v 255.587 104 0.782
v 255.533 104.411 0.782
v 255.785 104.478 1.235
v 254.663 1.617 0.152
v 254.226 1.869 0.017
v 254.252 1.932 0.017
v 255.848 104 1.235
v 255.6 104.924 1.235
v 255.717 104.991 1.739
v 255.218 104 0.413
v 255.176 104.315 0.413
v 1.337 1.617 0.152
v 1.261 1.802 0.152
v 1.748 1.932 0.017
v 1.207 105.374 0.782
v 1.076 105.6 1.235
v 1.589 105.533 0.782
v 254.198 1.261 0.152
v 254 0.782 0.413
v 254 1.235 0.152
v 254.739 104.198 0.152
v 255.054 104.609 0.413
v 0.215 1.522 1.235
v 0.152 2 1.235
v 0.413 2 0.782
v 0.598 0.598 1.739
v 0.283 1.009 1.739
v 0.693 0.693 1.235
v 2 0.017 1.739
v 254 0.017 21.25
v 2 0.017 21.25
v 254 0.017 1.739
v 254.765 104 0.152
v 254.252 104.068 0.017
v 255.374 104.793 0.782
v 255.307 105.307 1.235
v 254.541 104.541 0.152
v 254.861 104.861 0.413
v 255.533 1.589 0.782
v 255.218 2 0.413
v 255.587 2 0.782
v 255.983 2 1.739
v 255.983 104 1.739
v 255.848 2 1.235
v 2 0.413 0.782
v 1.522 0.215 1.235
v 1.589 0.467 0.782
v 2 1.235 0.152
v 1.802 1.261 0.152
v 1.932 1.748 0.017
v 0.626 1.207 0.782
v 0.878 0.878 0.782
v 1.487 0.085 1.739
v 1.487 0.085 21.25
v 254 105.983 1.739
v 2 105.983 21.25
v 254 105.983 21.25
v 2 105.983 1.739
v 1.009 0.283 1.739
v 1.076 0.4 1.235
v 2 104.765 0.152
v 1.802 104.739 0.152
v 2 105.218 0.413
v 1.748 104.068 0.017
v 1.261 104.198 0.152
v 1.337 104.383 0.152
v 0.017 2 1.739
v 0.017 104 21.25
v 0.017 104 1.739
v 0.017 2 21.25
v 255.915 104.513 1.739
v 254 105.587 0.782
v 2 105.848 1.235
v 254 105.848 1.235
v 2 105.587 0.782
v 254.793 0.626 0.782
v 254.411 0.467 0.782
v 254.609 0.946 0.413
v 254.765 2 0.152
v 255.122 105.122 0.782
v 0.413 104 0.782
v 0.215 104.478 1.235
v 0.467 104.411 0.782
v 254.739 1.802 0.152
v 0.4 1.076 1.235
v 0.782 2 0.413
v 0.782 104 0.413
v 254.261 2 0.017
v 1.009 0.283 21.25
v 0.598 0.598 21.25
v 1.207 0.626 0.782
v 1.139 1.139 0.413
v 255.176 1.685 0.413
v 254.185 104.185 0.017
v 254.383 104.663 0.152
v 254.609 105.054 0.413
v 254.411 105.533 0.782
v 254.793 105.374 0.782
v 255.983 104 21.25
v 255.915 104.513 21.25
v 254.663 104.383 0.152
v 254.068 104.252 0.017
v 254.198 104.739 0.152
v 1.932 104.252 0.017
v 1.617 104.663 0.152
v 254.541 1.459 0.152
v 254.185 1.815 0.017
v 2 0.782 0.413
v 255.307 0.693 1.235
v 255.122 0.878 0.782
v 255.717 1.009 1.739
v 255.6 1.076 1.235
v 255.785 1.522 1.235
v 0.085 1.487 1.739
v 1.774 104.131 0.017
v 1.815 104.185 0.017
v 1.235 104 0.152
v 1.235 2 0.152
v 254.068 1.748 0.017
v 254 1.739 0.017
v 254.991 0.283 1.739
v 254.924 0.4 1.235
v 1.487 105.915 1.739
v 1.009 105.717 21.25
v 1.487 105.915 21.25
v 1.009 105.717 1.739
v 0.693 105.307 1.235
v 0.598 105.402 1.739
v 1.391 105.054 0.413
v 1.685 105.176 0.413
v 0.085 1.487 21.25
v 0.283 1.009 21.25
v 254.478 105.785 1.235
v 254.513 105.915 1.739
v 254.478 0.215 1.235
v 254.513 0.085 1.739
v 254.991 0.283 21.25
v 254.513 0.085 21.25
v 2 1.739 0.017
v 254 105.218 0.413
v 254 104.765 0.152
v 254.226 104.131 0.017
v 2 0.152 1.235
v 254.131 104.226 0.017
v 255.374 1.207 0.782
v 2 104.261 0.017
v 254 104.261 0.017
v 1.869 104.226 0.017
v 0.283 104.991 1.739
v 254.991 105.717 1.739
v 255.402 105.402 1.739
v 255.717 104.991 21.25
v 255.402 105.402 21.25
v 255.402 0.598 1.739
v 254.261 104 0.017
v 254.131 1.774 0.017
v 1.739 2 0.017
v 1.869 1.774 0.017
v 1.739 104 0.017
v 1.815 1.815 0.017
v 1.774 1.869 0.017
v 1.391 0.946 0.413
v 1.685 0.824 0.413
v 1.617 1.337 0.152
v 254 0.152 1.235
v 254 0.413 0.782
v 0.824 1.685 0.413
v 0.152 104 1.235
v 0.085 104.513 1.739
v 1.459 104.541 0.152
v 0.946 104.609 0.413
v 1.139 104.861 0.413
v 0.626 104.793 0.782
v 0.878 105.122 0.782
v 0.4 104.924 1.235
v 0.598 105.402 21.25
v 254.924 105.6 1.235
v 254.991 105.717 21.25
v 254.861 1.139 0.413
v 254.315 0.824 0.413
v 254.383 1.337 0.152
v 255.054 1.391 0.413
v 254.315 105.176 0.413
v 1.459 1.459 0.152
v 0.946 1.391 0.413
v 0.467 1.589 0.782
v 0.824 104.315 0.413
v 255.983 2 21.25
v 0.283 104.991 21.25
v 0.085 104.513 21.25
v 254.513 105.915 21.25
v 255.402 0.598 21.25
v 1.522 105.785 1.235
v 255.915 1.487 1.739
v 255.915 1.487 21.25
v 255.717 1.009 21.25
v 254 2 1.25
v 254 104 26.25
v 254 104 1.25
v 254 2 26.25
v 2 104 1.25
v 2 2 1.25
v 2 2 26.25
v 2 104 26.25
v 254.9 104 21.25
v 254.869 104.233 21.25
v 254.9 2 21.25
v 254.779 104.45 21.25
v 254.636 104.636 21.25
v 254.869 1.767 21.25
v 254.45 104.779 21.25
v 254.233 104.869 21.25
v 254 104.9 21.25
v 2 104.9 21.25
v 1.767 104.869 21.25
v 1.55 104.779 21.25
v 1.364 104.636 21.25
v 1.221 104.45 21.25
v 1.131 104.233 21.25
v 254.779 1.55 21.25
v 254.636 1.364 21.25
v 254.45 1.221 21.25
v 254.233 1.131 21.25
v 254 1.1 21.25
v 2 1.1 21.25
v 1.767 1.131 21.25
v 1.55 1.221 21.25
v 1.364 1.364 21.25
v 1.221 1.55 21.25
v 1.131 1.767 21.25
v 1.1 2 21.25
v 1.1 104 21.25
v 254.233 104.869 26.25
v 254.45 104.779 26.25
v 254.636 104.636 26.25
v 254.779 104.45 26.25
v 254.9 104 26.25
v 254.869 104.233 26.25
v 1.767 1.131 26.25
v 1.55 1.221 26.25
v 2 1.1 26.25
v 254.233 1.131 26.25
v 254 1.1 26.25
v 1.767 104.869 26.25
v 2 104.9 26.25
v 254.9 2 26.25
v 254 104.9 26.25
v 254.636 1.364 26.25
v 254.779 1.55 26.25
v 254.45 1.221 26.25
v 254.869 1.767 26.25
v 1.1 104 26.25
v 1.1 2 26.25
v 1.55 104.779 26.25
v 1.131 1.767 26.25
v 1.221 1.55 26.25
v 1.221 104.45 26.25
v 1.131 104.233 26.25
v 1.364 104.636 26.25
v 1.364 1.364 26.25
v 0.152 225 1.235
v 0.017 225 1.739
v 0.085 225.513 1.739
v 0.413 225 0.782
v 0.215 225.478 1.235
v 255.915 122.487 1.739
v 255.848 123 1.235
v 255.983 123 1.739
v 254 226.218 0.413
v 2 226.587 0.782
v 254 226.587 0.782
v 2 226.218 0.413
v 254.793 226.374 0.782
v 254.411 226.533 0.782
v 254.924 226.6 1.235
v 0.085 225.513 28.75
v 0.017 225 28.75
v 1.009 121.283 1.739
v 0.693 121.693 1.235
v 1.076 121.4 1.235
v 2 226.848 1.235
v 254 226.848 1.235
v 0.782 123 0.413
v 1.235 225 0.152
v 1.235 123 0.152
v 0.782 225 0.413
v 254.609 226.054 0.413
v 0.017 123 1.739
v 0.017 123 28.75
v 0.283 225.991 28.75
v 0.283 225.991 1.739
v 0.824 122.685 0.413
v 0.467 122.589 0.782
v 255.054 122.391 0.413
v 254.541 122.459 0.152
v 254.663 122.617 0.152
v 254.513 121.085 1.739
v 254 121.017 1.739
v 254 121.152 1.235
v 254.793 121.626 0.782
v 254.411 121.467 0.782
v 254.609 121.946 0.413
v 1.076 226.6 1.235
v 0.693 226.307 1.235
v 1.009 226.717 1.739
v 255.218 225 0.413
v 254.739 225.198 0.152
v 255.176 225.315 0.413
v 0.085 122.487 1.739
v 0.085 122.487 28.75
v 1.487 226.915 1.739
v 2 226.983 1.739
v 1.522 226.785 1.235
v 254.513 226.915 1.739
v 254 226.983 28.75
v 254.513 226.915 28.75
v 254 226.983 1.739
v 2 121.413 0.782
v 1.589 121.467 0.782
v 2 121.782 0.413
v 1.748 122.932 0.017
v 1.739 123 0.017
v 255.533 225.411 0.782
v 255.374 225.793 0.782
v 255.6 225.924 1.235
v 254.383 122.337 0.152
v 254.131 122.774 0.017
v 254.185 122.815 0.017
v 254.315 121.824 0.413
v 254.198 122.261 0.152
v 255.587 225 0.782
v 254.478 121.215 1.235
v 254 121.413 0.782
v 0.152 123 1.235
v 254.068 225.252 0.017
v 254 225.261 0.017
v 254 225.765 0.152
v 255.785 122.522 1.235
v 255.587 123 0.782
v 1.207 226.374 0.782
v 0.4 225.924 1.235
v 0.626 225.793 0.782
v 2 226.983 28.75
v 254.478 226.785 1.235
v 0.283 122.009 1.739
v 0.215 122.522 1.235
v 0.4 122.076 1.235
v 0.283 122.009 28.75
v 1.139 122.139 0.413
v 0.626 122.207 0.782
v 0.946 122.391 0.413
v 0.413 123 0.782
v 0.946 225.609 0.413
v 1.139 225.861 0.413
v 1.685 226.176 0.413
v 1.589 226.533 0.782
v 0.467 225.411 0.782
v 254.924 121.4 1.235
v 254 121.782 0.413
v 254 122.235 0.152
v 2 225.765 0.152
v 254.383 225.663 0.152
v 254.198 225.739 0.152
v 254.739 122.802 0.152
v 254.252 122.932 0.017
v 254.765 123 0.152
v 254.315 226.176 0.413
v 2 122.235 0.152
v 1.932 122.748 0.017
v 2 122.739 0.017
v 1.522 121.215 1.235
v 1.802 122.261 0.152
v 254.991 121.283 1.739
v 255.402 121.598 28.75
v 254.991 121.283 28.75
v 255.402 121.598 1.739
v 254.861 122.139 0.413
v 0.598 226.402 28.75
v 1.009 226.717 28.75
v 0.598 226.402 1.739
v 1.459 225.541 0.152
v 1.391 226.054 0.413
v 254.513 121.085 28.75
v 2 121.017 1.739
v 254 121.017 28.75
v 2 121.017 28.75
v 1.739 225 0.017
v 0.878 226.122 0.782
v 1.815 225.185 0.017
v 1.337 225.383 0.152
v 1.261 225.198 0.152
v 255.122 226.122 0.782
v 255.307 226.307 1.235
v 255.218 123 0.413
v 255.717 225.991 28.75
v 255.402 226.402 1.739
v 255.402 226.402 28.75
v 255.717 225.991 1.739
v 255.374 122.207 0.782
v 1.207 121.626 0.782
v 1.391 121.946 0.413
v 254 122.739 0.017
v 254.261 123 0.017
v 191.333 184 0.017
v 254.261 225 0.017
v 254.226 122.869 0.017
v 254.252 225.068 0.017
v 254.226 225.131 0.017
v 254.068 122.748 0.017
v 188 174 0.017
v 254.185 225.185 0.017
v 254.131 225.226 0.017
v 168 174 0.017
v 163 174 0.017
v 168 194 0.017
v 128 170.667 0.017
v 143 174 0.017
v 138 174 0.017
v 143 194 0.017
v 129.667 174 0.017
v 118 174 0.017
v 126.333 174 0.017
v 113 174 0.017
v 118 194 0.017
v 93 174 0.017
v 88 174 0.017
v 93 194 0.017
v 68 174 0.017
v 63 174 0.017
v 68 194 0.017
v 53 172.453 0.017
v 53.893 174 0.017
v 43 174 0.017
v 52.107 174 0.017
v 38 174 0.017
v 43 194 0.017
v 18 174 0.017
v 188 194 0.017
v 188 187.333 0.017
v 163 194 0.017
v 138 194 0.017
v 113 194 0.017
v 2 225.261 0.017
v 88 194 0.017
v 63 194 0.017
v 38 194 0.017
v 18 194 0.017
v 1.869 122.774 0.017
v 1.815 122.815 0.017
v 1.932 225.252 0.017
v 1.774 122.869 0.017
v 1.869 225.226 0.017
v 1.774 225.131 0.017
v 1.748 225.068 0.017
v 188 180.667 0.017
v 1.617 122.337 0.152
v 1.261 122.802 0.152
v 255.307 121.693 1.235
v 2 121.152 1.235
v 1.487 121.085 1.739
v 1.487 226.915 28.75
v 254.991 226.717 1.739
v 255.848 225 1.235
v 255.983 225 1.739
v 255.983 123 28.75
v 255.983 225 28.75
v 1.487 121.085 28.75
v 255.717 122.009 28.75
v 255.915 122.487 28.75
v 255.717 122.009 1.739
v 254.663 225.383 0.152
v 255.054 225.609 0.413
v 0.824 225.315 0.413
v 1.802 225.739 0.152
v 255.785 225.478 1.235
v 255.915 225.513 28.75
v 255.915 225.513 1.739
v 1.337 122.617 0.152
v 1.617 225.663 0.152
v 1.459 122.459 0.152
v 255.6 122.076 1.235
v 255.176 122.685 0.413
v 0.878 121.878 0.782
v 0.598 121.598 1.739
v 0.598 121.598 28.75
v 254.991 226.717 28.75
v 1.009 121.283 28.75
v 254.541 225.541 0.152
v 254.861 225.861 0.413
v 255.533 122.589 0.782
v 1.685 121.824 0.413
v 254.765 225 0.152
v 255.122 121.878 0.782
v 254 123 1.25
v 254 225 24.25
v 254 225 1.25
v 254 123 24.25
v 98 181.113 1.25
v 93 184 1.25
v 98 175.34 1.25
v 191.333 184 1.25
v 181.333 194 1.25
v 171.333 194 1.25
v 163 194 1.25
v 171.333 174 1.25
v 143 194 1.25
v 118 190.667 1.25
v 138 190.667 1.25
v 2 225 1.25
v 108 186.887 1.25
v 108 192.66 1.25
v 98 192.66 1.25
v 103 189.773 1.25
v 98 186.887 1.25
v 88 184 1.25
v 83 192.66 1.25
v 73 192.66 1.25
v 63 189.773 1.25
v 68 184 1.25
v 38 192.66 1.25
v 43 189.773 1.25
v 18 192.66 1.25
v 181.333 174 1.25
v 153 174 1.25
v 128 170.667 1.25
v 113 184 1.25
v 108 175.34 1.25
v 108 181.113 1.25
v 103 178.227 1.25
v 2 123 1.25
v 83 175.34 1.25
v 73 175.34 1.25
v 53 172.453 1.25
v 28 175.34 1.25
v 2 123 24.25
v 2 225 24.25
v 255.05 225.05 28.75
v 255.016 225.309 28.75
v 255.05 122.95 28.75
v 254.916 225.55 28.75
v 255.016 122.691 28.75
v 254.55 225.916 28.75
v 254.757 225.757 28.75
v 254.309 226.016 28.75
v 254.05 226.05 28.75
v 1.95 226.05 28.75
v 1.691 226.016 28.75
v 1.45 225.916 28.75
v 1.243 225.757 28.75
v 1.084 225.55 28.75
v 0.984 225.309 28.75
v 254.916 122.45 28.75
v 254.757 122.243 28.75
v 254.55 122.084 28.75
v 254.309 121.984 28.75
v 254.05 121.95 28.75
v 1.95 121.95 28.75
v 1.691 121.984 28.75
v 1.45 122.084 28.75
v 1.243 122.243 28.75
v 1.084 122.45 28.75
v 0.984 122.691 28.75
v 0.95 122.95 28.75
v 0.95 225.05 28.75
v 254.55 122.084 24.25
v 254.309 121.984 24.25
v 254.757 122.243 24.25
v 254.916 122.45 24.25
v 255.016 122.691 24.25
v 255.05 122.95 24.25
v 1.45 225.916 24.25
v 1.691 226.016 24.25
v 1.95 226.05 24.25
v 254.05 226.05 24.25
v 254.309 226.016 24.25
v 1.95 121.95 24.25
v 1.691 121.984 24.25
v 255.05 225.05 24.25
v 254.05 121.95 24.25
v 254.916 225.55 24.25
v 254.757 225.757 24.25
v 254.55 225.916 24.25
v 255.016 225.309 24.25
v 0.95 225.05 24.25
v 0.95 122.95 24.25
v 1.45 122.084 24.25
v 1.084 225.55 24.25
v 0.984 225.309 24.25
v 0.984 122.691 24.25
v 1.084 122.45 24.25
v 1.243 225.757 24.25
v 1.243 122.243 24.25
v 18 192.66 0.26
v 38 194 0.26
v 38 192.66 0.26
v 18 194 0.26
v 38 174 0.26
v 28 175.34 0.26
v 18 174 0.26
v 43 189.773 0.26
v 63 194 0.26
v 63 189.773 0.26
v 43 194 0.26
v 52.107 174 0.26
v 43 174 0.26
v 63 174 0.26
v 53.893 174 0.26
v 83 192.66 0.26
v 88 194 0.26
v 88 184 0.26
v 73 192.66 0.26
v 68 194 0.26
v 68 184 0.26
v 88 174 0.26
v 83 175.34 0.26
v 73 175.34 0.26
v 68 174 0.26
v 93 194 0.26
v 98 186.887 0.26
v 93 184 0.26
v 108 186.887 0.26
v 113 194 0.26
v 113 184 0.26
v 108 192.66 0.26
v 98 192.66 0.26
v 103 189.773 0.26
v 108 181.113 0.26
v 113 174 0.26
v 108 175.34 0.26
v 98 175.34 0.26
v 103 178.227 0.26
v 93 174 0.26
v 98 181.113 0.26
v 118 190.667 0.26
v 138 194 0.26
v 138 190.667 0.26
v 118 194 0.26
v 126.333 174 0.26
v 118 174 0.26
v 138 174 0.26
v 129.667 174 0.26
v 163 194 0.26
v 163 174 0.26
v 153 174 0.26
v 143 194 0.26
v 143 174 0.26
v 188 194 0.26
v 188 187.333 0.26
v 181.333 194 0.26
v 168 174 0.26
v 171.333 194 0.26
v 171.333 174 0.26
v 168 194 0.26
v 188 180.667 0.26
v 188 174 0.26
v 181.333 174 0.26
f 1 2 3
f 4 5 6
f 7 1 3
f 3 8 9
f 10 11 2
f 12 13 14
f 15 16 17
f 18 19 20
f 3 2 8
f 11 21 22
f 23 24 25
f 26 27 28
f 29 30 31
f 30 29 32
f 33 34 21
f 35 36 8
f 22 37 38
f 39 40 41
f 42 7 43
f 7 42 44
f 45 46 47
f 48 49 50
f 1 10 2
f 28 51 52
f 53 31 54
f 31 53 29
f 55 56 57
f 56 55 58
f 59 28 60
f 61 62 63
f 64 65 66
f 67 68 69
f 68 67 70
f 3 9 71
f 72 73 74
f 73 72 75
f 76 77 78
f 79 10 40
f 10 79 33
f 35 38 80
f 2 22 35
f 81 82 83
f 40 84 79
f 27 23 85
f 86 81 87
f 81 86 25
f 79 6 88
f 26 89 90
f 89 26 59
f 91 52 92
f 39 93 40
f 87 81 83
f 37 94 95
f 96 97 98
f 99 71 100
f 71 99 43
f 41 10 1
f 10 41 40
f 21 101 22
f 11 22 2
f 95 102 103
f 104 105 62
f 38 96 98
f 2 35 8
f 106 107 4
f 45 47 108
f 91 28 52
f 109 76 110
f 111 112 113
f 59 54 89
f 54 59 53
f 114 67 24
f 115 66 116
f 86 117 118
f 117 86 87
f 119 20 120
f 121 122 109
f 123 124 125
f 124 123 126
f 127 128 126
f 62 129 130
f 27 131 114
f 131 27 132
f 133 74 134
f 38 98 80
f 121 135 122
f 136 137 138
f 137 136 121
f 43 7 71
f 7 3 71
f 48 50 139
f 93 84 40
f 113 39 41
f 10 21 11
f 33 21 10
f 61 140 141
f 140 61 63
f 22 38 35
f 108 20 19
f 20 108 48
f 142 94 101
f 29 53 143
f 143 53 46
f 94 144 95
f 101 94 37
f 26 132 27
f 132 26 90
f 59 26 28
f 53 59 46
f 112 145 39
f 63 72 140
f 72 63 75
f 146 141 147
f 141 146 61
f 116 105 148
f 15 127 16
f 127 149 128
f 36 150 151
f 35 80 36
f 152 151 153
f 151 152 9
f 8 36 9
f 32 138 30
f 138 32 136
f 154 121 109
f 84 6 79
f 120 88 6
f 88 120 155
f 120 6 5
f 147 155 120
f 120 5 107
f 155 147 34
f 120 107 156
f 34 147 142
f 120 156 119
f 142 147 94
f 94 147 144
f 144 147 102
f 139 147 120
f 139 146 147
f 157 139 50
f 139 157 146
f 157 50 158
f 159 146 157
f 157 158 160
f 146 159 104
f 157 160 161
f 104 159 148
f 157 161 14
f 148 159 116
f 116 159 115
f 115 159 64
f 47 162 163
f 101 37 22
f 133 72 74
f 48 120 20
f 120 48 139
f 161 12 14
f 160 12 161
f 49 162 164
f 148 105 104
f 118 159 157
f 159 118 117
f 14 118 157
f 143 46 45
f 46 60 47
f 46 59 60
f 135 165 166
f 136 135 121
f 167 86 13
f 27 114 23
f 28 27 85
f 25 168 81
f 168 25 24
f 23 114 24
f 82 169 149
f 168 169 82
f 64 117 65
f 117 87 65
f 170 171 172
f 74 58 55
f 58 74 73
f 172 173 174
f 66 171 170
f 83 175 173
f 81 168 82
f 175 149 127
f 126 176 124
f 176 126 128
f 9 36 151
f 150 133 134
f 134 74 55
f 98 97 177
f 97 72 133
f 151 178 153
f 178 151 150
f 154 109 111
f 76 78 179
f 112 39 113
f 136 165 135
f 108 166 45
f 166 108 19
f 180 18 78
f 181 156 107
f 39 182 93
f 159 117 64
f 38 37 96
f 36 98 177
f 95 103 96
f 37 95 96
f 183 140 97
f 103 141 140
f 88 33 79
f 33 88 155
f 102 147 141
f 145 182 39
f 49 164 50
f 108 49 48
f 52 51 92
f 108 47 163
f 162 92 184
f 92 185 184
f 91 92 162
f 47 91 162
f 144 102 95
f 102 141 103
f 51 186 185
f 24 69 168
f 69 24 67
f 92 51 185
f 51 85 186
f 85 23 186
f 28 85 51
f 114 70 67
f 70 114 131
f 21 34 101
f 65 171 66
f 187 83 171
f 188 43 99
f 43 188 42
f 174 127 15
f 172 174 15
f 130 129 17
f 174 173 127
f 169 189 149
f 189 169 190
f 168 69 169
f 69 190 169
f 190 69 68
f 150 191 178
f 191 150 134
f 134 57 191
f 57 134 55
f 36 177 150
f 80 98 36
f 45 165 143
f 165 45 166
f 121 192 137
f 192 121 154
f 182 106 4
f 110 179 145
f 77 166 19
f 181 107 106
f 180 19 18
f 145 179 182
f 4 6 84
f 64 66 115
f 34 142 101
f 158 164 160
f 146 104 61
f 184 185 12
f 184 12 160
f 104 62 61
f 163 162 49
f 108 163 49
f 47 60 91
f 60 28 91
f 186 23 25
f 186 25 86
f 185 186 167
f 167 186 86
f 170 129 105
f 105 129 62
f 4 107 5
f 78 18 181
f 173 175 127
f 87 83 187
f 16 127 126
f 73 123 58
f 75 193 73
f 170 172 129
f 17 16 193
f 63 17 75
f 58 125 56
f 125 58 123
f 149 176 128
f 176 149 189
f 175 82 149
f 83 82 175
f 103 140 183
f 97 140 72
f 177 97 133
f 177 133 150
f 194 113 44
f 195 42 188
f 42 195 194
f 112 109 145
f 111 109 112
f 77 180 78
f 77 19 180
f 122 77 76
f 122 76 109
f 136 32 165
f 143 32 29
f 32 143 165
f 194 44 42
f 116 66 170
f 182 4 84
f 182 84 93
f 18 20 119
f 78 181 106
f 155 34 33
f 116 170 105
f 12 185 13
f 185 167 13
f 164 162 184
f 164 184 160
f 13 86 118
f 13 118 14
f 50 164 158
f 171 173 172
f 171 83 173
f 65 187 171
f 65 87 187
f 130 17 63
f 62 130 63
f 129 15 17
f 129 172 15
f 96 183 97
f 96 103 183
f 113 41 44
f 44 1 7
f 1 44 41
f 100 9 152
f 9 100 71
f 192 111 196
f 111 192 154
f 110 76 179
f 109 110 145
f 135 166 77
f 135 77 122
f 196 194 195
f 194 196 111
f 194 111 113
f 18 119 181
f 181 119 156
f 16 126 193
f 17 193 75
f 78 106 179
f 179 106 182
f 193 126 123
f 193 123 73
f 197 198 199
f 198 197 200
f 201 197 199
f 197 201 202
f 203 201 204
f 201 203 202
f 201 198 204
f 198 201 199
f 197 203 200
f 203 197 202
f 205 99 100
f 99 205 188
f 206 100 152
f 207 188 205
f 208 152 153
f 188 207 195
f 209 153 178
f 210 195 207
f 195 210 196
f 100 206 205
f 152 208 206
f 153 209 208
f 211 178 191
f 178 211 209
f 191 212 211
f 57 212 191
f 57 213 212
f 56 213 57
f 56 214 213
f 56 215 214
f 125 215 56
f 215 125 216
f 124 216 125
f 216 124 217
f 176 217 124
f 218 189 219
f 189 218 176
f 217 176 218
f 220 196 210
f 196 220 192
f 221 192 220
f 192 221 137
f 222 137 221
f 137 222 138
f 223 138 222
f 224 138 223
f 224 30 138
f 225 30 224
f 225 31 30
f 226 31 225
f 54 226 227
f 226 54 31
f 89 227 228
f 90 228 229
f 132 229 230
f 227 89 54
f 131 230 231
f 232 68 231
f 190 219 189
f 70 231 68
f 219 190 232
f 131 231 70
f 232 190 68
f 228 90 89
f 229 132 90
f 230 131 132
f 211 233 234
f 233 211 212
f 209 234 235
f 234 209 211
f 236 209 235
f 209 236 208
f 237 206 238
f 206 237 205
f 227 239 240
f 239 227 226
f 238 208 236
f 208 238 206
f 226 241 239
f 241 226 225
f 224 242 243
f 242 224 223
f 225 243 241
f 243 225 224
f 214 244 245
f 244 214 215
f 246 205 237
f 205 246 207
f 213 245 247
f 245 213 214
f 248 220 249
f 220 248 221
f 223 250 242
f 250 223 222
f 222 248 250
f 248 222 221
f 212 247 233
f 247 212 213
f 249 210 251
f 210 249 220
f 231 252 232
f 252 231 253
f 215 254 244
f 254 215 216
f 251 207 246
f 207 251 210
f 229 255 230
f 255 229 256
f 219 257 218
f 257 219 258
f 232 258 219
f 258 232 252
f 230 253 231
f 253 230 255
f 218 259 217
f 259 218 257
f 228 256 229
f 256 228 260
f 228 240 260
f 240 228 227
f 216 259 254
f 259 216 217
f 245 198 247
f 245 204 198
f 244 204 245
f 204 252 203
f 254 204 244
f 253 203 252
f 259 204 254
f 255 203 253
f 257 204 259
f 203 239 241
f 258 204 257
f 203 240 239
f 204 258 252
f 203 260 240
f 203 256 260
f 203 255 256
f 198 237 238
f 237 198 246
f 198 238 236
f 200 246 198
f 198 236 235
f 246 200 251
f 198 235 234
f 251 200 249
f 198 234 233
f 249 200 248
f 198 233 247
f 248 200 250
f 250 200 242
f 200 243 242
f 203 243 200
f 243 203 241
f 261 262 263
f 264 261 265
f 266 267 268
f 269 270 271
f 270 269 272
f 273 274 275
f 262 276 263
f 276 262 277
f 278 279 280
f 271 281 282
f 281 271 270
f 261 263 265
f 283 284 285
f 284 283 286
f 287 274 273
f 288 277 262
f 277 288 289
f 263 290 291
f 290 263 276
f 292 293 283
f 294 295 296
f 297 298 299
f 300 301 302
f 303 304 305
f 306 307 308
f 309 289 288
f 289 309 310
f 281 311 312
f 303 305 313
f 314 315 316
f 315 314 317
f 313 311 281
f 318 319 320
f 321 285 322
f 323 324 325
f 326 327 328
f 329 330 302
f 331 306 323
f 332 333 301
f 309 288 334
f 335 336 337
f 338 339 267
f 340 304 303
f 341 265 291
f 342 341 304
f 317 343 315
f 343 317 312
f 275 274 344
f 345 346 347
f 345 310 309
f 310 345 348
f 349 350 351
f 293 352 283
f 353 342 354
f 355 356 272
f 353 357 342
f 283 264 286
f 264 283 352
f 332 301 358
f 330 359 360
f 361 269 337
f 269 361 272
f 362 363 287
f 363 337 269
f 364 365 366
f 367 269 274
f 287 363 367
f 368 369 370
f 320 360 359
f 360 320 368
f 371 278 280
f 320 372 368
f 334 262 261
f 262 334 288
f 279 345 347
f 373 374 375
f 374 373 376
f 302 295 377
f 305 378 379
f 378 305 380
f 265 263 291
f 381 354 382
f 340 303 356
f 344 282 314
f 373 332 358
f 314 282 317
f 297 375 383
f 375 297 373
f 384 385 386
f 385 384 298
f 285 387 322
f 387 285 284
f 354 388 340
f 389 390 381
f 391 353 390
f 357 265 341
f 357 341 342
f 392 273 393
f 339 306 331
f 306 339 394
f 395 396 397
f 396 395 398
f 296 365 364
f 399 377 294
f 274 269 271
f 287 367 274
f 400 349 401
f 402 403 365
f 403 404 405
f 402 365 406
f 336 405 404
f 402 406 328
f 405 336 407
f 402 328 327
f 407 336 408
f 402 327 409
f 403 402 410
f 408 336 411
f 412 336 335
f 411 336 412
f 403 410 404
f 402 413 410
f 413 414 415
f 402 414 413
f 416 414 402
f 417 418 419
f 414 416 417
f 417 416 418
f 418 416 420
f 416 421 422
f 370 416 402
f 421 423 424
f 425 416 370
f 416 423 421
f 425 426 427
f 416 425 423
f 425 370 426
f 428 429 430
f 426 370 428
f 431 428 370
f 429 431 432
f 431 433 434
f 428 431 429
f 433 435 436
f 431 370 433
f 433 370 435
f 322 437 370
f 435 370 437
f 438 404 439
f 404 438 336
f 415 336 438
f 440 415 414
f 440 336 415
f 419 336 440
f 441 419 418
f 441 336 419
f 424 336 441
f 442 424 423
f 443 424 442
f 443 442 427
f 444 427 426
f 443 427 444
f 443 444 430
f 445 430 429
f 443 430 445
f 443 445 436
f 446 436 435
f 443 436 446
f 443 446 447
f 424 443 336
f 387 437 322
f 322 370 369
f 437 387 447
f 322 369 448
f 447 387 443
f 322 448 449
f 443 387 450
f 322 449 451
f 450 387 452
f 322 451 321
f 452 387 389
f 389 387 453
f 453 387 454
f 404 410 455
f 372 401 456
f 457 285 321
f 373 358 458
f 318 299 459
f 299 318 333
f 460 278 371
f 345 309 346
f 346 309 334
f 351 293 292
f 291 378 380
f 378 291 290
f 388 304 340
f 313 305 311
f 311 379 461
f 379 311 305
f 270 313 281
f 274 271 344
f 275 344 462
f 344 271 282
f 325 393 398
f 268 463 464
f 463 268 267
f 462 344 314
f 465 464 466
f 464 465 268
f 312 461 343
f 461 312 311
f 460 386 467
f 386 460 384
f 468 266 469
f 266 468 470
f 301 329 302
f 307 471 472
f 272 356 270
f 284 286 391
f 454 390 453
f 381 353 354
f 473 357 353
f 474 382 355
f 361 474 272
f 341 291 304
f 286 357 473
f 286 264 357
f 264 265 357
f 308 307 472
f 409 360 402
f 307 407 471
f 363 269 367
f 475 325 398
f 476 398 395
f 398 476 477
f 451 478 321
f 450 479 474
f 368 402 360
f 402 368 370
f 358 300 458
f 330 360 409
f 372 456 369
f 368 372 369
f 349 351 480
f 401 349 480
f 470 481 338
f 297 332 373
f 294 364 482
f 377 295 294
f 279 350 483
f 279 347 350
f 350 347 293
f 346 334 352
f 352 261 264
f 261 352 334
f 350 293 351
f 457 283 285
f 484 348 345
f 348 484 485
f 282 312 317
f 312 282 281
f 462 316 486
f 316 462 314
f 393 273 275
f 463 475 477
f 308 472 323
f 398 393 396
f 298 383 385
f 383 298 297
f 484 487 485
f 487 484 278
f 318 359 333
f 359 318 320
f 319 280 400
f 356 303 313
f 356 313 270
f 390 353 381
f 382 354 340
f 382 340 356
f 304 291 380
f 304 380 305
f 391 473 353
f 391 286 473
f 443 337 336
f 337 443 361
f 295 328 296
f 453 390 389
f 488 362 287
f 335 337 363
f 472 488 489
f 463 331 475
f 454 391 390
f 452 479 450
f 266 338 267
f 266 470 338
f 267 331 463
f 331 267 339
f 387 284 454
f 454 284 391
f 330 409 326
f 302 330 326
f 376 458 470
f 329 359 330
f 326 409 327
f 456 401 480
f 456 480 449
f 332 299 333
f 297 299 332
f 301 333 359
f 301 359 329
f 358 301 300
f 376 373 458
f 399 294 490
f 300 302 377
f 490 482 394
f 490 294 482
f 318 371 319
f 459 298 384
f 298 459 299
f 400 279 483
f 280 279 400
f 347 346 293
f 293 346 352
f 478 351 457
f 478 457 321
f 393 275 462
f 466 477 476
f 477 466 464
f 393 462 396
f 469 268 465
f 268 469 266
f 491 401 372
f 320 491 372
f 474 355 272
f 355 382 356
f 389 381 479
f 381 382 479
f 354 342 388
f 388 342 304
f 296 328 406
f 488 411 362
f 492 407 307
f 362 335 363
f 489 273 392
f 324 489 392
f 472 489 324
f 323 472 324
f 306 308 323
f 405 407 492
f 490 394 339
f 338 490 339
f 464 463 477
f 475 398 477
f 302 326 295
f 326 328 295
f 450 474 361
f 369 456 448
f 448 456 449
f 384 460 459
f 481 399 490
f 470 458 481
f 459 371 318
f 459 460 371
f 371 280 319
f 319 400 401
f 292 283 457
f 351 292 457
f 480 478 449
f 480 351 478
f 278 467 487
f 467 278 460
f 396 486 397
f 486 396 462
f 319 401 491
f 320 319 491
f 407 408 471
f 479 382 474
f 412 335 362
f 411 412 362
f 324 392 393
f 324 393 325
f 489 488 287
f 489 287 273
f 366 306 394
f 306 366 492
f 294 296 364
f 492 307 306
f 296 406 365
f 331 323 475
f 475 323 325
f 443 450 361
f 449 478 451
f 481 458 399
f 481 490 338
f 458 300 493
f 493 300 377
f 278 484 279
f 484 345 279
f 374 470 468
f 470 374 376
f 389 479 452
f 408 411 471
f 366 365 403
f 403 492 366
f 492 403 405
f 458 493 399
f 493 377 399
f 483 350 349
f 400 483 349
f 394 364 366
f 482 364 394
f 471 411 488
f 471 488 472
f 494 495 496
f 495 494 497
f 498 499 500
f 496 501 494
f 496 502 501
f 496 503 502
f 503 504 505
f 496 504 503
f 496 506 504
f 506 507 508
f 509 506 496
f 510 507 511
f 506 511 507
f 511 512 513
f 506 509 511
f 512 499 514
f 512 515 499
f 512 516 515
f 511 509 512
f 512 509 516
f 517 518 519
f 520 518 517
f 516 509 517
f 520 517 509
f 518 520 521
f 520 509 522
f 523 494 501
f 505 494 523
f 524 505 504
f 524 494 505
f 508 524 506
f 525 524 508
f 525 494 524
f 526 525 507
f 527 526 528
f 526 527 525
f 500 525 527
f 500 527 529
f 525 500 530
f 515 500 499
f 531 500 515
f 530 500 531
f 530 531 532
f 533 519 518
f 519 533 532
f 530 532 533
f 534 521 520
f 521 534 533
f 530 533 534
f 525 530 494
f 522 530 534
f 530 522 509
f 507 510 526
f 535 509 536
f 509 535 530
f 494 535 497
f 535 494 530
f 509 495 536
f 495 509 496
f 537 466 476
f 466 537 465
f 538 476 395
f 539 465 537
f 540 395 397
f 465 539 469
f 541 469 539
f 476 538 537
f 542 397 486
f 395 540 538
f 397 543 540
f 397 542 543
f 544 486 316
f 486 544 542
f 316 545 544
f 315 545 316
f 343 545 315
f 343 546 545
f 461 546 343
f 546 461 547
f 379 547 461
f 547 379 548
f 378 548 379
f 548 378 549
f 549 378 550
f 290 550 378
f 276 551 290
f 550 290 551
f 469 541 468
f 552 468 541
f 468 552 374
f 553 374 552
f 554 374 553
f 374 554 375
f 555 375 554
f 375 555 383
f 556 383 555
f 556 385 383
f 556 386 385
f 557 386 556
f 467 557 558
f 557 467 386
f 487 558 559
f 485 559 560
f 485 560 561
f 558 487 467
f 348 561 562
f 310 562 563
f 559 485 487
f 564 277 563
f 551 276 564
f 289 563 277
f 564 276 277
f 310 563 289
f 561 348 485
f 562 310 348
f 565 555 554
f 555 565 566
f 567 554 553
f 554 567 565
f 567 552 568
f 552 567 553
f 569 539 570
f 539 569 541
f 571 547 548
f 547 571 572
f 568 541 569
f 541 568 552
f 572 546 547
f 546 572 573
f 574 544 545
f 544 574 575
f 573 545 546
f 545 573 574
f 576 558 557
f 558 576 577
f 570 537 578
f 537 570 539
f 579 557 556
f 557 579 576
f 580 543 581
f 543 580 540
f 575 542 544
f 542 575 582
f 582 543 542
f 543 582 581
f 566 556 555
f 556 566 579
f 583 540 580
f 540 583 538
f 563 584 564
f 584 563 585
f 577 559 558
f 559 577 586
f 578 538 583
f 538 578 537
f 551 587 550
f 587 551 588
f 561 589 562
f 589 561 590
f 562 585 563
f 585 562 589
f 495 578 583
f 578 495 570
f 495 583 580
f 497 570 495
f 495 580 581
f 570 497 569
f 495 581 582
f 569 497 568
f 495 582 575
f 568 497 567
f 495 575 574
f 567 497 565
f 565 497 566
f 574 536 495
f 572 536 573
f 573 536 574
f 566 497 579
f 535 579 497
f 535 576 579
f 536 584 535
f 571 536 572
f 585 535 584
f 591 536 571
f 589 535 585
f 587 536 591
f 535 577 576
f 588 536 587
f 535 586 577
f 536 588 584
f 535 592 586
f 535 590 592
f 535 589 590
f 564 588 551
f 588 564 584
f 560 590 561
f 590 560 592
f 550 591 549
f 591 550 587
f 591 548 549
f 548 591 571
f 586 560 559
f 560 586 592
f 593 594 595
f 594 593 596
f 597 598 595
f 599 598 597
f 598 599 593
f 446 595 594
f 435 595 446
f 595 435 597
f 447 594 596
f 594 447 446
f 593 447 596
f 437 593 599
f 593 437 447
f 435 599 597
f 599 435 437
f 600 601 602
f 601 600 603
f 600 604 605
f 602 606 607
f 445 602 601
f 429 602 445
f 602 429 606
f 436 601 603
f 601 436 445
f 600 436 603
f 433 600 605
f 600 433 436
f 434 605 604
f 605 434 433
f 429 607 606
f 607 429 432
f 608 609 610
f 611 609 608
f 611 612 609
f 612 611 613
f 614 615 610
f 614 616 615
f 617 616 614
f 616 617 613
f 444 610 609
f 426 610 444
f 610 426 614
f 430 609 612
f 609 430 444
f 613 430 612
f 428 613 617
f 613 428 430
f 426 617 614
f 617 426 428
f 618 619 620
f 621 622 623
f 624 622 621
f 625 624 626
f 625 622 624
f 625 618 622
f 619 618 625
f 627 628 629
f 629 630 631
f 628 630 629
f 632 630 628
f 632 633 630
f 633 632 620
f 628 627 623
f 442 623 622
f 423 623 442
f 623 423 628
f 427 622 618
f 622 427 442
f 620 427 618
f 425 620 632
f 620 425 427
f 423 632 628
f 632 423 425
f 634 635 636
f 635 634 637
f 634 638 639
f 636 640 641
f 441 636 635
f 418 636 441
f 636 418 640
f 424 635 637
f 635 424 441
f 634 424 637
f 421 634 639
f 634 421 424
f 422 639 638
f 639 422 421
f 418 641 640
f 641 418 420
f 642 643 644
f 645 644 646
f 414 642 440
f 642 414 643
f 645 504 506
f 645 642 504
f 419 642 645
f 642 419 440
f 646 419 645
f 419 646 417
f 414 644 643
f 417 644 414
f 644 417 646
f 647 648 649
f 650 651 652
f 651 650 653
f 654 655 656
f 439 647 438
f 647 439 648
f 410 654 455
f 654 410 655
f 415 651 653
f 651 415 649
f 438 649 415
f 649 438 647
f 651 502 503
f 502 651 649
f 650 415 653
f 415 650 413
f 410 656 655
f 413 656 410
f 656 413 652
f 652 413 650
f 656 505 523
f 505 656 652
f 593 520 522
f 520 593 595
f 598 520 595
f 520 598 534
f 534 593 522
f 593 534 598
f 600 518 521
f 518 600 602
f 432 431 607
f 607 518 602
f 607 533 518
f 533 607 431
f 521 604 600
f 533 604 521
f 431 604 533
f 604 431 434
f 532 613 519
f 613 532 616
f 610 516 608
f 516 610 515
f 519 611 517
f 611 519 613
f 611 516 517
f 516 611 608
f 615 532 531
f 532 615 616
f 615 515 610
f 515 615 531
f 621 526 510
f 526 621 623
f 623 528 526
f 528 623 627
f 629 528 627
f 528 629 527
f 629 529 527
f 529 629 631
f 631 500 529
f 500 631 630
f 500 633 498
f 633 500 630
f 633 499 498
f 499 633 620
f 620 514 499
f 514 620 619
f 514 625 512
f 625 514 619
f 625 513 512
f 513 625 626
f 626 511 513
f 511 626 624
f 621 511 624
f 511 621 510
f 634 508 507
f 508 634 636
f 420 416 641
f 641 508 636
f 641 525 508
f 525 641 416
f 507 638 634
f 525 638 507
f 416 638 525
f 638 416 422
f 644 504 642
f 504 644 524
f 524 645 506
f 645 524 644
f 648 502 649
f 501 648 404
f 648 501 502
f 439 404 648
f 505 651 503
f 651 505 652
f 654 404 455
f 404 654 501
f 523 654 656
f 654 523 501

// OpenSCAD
//-----------------------------------------------------------------------
// Yet Another Parameterized Projectbox generator
//
//  This is a box for <template>
//
//  Version 3.0 (03-12-2023)
//
// This design is parameterized based on the size of a PCB.
//
//  You might need to adjust the number of elements:
//
//      Preferences->Advanced->Turn of rendering at 250000 elements
//                                                  ^^^^^^
//
//-----------------------------------------------------------------------

include <../YAPPgenerator_v3.scad>

// Note: length/lengte refers to X axis, 
//       width/breedte to Y, 
//       height/hoogte to Z

/*
            padding-back>|<---- pcb length ---->|<padding-front
                                 RIGHT
                   0    X-ax ---> 
               +----------------------------------------+   ---
               |                                        |    ^
               |                                        |   padding-right 
             ^ |                                        |    v
             | |    -5,y +----------------------+       |   ---              
        B    Y |         | 0,y              x,y |       |     ^              F
        A    - |         |                      |       |     |              R
        C    a |         |                      |       |     | pcb width    O
        K    x |         |                      |       |     |              N
               |         | 0,0              x,0 |       |     v              T
               |   -5,0  +----------------------+       |   ---
               |                                        |    padding-left
             0 +----------------------------------------+   ---
               0    X-ax --->
                                 LEFT
*/


//-- which part(s) do you want to print?
printBaseShell        = true;
printLidShell         = true;
printSwitchExtenders  = false;

//-- pcb dimensions -- very important!!!
pcbLength           = 250; // Front to back
pcbWidth            = 100; // Side to side
pcbThickness        = 1.6;
                            
//-- padding between pcb and inside wall
paddingFront        = 1;
paddingBack         = 1;
paddingRight        = 1;
paddingLeft         = 1;

//-- Edit these parameters for your own box dimensions
wallThickness       = 2.0;
basePlaneThickness  = 1.25;
lidPlaneThickness   = 1.25;

//-- Total height of box = lidPlaneThickness 
//                       + lidWallHeight 
//--                     + baseWallHeight 
//                       + basePlaneThickness
//-- space between pcb and lidPlane :=
//--      (bottonWallHeight+lidWallHeight) - (standoffHeight+pcbThickness)
baseWallHeight      = 25;
lidWallHeight       = 23;

//-- ridge where base and lid off box can overlap
//-- Make sure this isn't less than lidWallHeight
ridgeHeight         = 5.0;
ridgeSlack          = 0.2;
roundRadius         = 2.0;

//-- How much the PCB needs to be raised from the base
//-- to leave room for solderings and whatnot
standoffHeight      = 10.0;  //-- used only for pushButton and showPCB
standoffPinDiameter = 2.4;
standoffHoleSlack   = 0.4;
standoffDiameter    = 8;



//-- C O N T R O L -------------//-> Default ---------
showSideBySide      = false;     //-> true
previewQuality      = 5;        //-> from 1 to 32, Default = 5
renderQuality       = 6;        //-> from 1 to 32, Default = 8
onLidGap            = 2;
shiftLid            = 5;
colorLid            = "gray";   
alphaLid            = 1;//0.2;   
colorBase           = "yellow";
alphaBase           = 1;//0.2;
hideLidWalls        = false;    //-> false
hideBaseWalls       = false;    //-> false
showOrientation     = true;
showPCB             = false;
showSwitches        = false;
showPCBmarkers      = false;
showShellZero       = false;
showCenterMarkers   = false;
inspectX            = 0;        //-> 0=none (>0 from Back)
inspectY            = 0;        //-> 0=none (>0 from Right)
inspectZ            = 0;        //-> 0=none (>0 from Bottom)
inspectXfromBack    = true;     // View from the inspection cut foreward
inspectYfromLeft    = true;     //-> View from the inspection cut to the right
inspectZfromTop     = false;    //-> View from the inspection cut down
//-- C O N T R O L ---------------------------------------

//===================================================================
//  *** Cutouts ***
//    There are 6 cutouts one for each surface:
//      cutoutsBase (Bottom), cutoutsLid (Top), cutoutsFront, cutoutsBack, cutoutsLeft, cutoutsRight
//-------------------------------------------------------------------
//  Default origin =  yappCoordPCB : pcb[0,0,0]
//
//                        Required                Not Used        Note
//----------------------+-----------------------+---------------+------------------------------------
//  yappRectangle       | width, length         | radius        |
//  yappCircle          | radius                | width, length |
//  yappRoundedRect     | width, length, radius |               |     
//  yappCircleWithFlats | width, radius         | length        | length=distance between flats
//  yappCircleWithKey   | width, length, radius |               | width = key width length=key depth
//  yappPolygon         | width, length         | radius        | yappPolygonDef object must be
//                      |                       |               | provided
//----------------------+-----------------------+---------------+------------------------------------
//
//  Parameters:
//   Required:
//    p(0) = from Back
//    p(1) = from Left
//    p(2) = width
//    p(3) = length
//    p(4) = radius
//    p(5) = shape : { yappRectangle | yappCircle | yappPolygon | yappRoundedRect 
//                    | yappCircleWithFlats | yappCircleWithKey }
//  Optional:
//    p(6) = depth : Default = 0/Auto : 0 = Auto (plane thickness)
//    p(7) = angle : Default = 0
//    n(a) = { yappPolygonDef } : Required if shape = yappPolygon specified -
//    n(b) = { yappMaskDef } : If a yappMaskDef object is added it will be used as a mask 
//                             for the cutout.
//    n(c) = { [yappMaskDef, hOffset, vOffset, rotation] } : If a list for a mask is added 
//                              it will be used as a mask for the cutout. With the Rotation 
//                              and offsets applied. This can be used to fine tune the mask
//                              placement within the opening.
//    n(d) = { <yappCoordPCB> | yappCoordBox | yappCoordBoxInside }
//    n(e) = { <yappOrigin>, yappCenter }
//    n(f) = { <yappGlobalOrigin>, yappLeftOrigin } // Only affects Top(lid), Back and Right Faces
//    n(g) = [yappPCBName, "XXX"] : Specify a PCB. Defaults to [yappPCBName, "Main"]
//    n(h) = { yappFromInside } Make the cut from the inside towards the outside
//-------------------------------------------------------------------

cutoutsBase = 
[
];

cutoutsLid  = 
[

//yappCenter demo
/*
    [10, 10, 10, 20, undef, yappRectangle]                              //(A)
   ,[10, 50, 10, 20, undef, yappRectangle, yappCenter]                  //(B)

   ,[30, 10, undef, undef, 5, yappCircle, ]                             //(C)
   ,[30, 50, undef, undef, 5, yappCircle, yappCenter]                   //(D)
 
   ,[50, 10, 10, 20, 2, yappRoundedRect, ]                              //(E)
   ,[50, 50, 10, 20, 2, yappRoundedRect, yappCenter]                    //(F)
 
   ,[70, 10, 15, undef, 10, yappCircleWithFlats, ]                      //(G)
   ,[70, 50, 15, undef, 10, yappCircleWithFlats, yappCenter]            //(H)
 
   ,[90, 10, 5, 2, 8, yappCircleWithKey, ]                              //(I)
   ,[90, 50, 5, 2, 8, yappCircleWithKey, yappCenter]                    //(J)
 
   ,[110, 10, 20, 20, undef, yappPolygon, shape6ptStar]                 //(K)
   ,[110, 50, 20, 20, undef, yappPolygon, shape6ptStar, yappCenter]     //(L)
   
*/


 // [0, 40, 20, 20, undef, yappRectangle, 0.2, yappCenter]                              //(A)
 [25, 40, 20, 20, undef, yappRectangle, 0.2, yappCenter]                              //(A)
 ,[50, 40, 20, 20, undef, yappRectangle, 0.2, yappCenter]                              //(A)
 ,[75, 40, 20, 20, undef, yappRectangle, 0.2, yappCenter]                              //(A)
 ,[100, 40, 20, 20, undef, yappRectangle, 0.2, yappCenter]                              //(A)
 ,[125, 40, 20, 20, undef, yappRectangle, 0.2, yappCenter]                              //(A)
 ,[150, 40, 20, 20, undef, yappRectangle, 0.2, yappCenter]                              //(A)
 ,[175, 40, 20, 20, undef, yappRectangle, 0.2, yappCenter]                              //(A)
 //,[200, 40, 20, 20, undef, yappRectangle, 0.2, yappCenter]                              //(A)

 ,[25, 40, 20, 20, undef, yappPolygon, undef, $t*360, shapeIsoTriangle, yappCenter]
 ,[50, 40, 20, 20, undef, yappPolygon, undef, $t*360, shapeIsoTriangle2, yappCenter]
 ,[75, 40, 20, 20, undef, yappPolygon, undef, $t*360, shapeHexagon, yappCenter]
 ,[100, 40, 20, 20, undef, yappPolygon, undef, $t*360, shape6ptStar, yappCenter]
 ,[125, 40, 20, 20, undef, yappPolygon, undef, $t*360, shapeTriangle, yappCenter]
 ,[150, 40, 20, 20, undef, yappPolygon, undef, $t*360, shapeTriangle2, yappCenter]
 ,[175, 40, 20, 20, undef, yappPolygon, undef, $t*360, shapeArrow, yappCenter]
 //,[200, 40, 20, 20, undef, yappPolygon, undef, $t*360, shapeArrow2, yappCenter]
 
 // Mask Demo
//   ,[ 160, 55, 50, 50, 10, yappRectangle, 1, shapeHexagon, [maskHoneycomb,0,0,0], yappCenter, yappFromInside]
//   ,[ 160, 55, 50, 50, 10, yappRectangle, 1, shapeHexagon, [maskHoneycomb,0,0,0], yappCenter, yappFromInside]
];

cutoutsFront = 
[
];  


cutoutsBack = 
[
];


cutoutsLeft = 
[
 //--  0,  1,  2,  3, 4, 5,6,7,n
//    [ 30,  3, 25, 15, 3, yappRoundedRect, 1]
 //  ,[ 60, 3, 25, 15, 3, yappRoundedRect, 1, yappFromInside] 
 //  ,[ 20, 1, 5, 5, 1, yappRoundedRect, 5, yappFromInside, yappCoordBox] // Cuts out into mounting tab
];

cutoutsRight = 
[
];


//===================================================================
//  *** Box Mounts ***
//  Mounting tabs on the outside of the box
//-------------------------------------------------------------------
//  Default origin = yappCoordBox: box[0,0,0]
//
//  Parameters:
//   Required:
//    p(0) = pos : position along the wall : [pos,offset] : vector for position and offset X.
//                    Position is to center of mounting screw in leftmost position in slot
//    p(1) = screwDiameter
//    p(2) = width of opening in addition to screw diameter 
//                    (0=Circular hole screwWidth = hole twice as wide as it is tall)
//    p(3) = height
//   Optional:
//    p(4) = filletRadius : Default = 0/Auto(0 = auto size)
//    n(a) = { yappLeft | yappRight | yappFront | yappBack } : one or more
//    n(b) = { yappNoFillet }
//    n(c) = { <yappBase>, yappLid }
//    n(d) = { yappCenter } : shifts Position to be in the center of the opening instead of 
//                            the left of the opening
//    n(e) = { <yappGlobalOrigin>, yappLeftOrigin } : Only affects Back and Right Faces
//-------------------------------------------------------------------
boxMounts =
[
//  [20, 6, 6, 3, yappLeft]
];




//---- This is where the magic happens ----
YAPPgenerate();
